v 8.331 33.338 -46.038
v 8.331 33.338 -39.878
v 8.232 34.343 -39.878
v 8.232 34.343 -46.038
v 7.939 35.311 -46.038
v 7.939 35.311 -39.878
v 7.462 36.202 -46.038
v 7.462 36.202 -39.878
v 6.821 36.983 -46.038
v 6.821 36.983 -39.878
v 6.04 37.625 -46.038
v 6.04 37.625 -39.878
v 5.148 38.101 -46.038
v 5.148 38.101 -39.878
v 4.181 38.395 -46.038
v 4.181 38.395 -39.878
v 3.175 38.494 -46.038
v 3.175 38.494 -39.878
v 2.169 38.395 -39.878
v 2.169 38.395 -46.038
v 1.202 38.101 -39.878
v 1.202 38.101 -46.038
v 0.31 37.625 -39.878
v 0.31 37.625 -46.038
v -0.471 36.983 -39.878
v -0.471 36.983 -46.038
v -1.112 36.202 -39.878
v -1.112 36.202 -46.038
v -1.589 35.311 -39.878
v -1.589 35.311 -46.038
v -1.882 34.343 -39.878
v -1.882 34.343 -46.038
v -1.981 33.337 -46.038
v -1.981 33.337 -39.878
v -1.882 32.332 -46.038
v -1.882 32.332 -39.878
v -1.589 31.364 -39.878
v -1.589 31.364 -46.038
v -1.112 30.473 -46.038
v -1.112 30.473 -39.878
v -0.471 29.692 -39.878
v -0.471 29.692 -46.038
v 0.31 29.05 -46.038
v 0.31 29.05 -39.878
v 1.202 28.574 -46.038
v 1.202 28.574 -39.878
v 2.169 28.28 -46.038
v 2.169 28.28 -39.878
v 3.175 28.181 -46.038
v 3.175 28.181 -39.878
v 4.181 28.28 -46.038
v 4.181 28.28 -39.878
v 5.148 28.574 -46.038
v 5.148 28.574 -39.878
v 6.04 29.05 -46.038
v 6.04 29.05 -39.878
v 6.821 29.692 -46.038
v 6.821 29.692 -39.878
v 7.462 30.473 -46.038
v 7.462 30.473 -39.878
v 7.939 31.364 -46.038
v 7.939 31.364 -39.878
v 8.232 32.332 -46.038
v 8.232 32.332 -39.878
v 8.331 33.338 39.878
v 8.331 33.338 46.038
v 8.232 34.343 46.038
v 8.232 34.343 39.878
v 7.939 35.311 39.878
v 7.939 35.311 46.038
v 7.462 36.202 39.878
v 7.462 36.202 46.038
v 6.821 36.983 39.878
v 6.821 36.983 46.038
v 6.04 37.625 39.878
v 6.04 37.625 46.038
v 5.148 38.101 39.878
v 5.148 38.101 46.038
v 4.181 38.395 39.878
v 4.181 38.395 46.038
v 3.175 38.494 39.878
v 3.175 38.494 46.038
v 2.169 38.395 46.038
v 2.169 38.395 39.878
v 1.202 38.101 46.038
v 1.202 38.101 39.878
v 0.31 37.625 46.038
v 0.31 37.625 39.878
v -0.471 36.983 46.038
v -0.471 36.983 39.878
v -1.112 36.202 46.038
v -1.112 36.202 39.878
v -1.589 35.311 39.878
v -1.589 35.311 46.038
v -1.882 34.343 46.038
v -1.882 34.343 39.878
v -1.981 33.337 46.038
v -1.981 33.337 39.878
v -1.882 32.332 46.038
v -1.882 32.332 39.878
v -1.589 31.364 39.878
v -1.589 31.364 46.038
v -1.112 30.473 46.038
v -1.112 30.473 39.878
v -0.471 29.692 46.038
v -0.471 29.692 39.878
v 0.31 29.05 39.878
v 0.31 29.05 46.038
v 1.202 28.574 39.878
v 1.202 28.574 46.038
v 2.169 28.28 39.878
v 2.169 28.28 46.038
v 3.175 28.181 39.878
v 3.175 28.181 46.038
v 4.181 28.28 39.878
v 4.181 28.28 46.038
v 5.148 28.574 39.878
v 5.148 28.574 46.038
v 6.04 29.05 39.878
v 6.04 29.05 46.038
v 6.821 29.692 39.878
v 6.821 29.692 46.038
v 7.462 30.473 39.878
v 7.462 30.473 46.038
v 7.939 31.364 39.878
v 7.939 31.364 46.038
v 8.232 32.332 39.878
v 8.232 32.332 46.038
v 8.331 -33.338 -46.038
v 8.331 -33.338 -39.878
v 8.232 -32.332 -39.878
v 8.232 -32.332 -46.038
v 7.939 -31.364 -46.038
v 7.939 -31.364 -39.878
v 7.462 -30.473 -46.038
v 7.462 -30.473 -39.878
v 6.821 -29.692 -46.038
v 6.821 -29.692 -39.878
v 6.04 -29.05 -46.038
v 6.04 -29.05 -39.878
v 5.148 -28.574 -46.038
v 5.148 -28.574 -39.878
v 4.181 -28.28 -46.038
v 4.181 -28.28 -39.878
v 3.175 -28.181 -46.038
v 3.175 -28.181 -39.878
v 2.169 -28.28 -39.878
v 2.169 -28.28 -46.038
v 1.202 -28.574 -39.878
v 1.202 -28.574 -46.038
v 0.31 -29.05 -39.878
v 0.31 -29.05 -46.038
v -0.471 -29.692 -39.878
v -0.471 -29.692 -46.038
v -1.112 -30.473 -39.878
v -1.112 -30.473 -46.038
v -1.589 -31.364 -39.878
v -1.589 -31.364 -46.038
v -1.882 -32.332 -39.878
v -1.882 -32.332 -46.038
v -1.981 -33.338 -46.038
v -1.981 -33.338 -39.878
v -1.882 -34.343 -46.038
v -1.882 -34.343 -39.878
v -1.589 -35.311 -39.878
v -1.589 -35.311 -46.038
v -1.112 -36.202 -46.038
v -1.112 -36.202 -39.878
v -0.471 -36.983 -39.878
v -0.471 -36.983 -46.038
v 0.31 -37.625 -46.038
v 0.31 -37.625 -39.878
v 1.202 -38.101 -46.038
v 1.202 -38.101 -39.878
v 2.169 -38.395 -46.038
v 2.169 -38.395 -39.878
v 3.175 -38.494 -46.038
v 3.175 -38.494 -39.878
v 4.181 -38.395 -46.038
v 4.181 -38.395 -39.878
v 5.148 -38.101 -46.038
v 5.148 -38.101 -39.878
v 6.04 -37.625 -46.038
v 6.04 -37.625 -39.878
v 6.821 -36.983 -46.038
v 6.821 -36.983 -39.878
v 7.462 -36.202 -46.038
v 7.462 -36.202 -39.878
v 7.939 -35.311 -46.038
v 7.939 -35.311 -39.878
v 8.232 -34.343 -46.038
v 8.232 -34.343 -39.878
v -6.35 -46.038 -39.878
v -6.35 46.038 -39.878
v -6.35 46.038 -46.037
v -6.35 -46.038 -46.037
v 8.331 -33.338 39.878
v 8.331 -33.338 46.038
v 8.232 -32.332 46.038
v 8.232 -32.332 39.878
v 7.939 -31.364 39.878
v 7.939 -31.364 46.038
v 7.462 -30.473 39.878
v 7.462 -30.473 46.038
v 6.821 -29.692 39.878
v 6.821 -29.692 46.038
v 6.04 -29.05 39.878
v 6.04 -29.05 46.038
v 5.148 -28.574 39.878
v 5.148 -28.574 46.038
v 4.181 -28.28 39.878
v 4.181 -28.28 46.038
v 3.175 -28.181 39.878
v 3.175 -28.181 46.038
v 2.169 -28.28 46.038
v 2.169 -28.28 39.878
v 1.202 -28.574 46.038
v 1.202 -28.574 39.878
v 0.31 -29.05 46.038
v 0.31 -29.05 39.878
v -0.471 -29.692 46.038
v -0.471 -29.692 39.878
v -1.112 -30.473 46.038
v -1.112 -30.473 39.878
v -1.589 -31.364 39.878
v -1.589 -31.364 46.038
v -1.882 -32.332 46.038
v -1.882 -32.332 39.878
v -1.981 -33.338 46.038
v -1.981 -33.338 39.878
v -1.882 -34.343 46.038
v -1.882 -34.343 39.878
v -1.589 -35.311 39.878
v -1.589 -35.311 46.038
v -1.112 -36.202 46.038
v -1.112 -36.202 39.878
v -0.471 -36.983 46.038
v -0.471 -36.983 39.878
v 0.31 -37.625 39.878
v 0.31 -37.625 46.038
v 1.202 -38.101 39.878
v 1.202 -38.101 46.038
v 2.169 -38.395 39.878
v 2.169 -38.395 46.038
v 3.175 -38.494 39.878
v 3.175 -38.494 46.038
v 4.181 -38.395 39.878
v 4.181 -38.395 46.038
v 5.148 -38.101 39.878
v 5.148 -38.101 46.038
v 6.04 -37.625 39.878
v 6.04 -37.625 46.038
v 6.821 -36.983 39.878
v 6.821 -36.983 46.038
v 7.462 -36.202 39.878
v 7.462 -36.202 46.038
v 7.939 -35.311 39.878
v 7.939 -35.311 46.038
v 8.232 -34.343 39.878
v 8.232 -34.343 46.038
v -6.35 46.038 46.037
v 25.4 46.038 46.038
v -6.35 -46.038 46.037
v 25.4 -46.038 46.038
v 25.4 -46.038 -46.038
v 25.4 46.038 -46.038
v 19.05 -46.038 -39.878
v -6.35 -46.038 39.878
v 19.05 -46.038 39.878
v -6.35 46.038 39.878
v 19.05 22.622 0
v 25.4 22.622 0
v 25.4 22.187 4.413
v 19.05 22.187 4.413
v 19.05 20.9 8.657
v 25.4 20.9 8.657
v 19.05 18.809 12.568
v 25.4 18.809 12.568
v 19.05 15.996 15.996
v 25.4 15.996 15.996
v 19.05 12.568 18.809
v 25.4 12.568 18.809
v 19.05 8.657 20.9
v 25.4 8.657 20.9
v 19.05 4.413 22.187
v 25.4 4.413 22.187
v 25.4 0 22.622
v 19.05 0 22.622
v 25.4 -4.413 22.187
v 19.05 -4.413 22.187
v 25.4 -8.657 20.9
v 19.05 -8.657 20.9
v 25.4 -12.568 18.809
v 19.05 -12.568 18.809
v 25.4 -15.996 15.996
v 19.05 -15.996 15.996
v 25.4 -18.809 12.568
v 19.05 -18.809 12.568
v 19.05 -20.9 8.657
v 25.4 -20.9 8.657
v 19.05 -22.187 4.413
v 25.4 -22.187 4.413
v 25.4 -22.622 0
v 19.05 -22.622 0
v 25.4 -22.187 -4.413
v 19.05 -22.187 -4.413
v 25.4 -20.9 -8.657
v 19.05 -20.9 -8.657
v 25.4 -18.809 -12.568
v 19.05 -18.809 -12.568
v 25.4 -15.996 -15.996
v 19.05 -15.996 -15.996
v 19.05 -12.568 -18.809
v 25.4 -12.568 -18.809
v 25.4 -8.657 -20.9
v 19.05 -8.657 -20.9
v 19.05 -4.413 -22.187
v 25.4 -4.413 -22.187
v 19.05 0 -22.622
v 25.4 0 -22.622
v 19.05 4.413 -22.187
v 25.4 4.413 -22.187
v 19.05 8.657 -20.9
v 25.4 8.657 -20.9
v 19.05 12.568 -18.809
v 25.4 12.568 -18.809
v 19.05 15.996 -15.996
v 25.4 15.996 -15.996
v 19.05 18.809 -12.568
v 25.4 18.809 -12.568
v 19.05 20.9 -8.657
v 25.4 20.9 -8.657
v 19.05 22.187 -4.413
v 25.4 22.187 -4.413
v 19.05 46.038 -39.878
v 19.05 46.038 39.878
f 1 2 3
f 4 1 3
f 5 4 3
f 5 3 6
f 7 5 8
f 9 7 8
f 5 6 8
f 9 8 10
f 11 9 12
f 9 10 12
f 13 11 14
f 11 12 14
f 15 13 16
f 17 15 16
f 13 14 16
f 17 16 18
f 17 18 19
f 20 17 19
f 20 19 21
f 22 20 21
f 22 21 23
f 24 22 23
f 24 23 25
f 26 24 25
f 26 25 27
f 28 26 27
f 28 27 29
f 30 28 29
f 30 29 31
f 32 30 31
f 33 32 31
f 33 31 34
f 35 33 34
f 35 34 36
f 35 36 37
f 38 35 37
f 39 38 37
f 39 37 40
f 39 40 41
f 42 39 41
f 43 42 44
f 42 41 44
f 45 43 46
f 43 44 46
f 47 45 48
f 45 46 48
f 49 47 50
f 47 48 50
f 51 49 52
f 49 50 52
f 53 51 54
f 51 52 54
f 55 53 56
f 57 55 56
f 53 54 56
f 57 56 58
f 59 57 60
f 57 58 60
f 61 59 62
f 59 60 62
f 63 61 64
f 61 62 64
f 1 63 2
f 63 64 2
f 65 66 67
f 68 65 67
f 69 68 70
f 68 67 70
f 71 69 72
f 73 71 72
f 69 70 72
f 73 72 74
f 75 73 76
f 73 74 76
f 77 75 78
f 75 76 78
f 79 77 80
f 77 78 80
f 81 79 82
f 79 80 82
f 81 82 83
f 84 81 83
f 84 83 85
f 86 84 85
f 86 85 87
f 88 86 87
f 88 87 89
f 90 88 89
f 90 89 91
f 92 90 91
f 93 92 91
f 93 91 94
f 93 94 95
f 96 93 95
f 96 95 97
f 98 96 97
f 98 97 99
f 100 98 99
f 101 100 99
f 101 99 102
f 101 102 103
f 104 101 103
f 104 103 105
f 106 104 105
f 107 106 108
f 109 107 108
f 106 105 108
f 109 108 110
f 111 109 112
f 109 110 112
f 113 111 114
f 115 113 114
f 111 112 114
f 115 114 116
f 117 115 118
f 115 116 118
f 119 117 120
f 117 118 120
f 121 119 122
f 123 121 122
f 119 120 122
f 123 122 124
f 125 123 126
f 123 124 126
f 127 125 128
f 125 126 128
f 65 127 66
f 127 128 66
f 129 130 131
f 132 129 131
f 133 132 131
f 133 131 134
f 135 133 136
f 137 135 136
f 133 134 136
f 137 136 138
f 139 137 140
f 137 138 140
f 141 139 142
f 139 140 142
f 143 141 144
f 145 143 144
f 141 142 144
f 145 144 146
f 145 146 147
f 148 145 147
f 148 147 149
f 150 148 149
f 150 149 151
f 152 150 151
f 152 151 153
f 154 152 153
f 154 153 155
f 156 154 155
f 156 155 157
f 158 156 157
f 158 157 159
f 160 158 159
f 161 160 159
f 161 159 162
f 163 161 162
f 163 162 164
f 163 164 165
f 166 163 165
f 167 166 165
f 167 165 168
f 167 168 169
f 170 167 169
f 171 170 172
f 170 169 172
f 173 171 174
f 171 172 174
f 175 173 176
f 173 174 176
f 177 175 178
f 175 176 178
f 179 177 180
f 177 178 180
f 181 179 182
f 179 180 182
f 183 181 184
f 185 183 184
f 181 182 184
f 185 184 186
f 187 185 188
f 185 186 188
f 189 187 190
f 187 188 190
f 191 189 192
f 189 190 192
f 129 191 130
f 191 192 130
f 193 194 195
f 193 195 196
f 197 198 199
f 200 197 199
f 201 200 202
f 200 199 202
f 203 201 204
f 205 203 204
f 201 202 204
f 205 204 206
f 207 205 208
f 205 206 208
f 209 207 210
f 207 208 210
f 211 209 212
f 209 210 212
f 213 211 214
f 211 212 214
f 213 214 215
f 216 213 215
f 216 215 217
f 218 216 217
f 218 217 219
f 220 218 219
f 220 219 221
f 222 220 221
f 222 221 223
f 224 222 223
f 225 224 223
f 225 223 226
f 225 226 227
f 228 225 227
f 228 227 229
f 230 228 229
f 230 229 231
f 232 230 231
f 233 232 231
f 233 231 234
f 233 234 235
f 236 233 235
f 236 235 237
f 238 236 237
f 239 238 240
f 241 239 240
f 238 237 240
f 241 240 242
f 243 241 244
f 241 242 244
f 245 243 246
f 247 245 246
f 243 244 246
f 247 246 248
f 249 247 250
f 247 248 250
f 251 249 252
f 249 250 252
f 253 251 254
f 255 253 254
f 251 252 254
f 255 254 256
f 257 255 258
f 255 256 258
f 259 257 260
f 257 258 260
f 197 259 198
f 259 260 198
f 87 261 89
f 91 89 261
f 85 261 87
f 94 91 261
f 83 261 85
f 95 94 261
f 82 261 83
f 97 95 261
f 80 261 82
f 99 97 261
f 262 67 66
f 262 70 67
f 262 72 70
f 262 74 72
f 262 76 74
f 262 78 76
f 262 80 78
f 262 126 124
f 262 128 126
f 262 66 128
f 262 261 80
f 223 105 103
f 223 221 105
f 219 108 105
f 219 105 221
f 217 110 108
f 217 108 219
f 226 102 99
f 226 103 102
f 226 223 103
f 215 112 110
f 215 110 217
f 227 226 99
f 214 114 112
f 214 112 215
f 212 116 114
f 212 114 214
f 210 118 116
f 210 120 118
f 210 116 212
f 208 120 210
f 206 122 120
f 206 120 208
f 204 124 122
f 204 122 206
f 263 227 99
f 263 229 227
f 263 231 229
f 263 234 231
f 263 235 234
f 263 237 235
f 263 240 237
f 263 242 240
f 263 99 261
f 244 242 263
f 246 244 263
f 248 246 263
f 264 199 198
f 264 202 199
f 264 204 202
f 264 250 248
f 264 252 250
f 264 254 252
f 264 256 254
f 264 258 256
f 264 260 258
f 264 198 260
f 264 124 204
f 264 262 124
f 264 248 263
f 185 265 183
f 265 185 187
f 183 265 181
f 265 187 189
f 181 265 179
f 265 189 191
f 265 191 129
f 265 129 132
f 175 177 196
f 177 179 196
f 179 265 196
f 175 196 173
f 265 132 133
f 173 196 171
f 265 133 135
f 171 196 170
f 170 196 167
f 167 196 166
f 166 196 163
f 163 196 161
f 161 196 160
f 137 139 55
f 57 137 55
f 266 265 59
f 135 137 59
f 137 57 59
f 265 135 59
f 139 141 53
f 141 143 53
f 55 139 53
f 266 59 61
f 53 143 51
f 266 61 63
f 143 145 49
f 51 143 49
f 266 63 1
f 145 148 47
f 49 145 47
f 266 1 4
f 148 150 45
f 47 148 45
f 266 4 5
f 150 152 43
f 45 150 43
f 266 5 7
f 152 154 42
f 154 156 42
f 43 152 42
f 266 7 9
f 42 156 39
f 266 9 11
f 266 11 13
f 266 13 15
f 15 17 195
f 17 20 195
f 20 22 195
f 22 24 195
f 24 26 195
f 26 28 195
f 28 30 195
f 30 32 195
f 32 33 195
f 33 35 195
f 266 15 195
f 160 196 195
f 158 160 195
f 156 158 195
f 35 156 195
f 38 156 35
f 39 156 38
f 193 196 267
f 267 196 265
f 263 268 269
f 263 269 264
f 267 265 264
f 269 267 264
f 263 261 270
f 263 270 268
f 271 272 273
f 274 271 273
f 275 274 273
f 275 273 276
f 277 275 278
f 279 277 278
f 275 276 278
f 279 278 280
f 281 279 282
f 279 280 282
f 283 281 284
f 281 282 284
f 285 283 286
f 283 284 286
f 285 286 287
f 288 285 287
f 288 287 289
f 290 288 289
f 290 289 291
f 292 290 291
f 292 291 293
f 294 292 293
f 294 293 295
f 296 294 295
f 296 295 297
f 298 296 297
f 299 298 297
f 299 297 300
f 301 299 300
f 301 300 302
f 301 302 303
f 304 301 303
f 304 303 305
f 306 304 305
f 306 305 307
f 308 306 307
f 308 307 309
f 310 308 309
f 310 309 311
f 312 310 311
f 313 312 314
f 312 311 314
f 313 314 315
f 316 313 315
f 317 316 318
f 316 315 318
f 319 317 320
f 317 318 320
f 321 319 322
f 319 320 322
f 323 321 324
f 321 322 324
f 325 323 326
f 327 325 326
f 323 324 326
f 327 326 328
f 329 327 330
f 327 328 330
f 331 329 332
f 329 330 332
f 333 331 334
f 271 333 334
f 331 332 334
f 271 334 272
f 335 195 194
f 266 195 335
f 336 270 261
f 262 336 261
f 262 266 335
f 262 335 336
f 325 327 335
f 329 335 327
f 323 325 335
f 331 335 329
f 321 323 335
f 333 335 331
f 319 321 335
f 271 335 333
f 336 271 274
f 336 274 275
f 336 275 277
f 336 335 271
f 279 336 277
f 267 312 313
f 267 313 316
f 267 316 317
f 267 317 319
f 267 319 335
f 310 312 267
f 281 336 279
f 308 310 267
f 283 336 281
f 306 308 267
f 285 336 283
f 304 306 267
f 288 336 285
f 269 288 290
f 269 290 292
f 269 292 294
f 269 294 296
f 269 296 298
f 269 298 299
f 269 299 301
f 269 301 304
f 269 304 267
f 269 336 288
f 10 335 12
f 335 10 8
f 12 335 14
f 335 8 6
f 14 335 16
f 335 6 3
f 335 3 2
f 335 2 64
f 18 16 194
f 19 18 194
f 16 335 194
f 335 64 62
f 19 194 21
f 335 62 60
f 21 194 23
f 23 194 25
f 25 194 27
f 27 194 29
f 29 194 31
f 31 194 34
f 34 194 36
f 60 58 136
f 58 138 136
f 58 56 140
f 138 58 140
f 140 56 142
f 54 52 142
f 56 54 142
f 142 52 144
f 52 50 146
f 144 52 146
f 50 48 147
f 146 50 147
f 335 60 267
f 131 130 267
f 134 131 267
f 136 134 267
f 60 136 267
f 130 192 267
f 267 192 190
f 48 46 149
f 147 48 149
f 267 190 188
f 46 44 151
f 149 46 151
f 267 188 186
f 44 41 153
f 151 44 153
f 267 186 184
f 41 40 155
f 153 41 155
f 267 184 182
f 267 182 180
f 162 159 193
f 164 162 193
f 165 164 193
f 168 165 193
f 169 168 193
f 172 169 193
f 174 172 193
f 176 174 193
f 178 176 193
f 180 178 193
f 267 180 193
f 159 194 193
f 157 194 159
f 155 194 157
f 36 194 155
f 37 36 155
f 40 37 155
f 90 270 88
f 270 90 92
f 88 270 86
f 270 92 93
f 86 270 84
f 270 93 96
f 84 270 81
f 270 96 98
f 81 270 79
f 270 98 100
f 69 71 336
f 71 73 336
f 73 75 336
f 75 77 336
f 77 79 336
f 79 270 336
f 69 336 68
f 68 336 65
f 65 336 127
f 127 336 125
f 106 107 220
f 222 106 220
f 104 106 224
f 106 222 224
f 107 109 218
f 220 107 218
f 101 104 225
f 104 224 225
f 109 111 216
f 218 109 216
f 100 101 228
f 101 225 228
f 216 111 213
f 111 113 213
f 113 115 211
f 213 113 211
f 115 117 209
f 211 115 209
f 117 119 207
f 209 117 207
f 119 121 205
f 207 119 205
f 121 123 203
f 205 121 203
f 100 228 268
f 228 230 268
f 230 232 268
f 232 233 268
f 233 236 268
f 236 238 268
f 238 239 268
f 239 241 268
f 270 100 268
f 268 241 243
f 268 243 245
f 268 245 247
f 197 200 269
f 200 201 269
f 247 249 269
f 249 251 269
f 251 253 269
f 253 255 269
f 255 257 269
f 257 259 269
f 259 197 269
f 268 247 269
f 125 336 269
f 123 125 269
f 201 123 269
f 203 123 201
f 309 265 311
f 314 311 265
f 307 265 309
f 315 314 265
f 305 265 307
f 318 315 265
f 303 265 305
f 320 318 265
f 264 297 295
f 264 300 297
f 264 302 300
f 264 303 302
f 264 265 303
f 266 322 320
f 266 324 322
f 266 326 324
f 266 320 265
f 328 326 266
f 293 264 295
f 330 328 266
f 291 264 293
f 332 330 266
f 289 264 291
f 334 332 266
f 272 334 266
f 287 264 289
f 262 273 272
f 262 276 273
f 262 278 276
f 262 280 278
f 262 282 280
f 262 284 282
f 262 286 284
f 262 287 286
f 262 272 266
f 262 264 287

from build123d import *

# Parameters (mm, degrees)
F0_W     = 92.075
F0_H     = 92.075
F1_DEPTH = 25.4
F2_W     = 165.1
F2_H     = 79.756
F3_DEPTH = 19.05
F4_R     = 22.621875
F5_DEPTH = 25.401
F6_W     = 92.075
F6_H     = 6.1595
F7_DEPTH = 6.35
F8_R     = 5.1562
F9_DEPTH = 92.076


with BuildPart() as f1:
    # F0 (on Right) → F1 (new body)
    with BuildSketch(Plane.YZ):
        Rectangle(F0_W, F0_H)
    extrude(amount=F1_DEPTH)

    # F2 (on face) → F3 (cut)
    with BuildSketch(Plane(origin=(0, 0, 0), x_dir=(0, -1, 0), z_dir=(-1, 0, 0))):
        Rectangle(F2_W, F2_H)
    extrude(amount=-F3_DEPTH, mode=Mode.SUBTRACT)

    # F4 (on face) → F5 (cut, through all)
    with BuildSketch(Plane.YZ.offset(25.4)):
        Circle(F4_R)
    extrude(amount=-F5_DEPTH, mode=Mode.SUBTRACT)

    # F6 (on face) → F7 (join)
    with BuildSketch(Plane(origin=(0, 0, 0), x_dir=(0, -1, 0), z_dir=(-1, 0, 0))):
        with Locations((0, 42.95775)):
            Rectangle(F6_W, F6_H)
        with Locations((0, -42.95775)):
            Rectangle(F6_W, F6_H)
    extrude(amount=F7_DEPTH)

    # F8 (on face) → F9 (cut, through all)
    with BuildSketch(Plane.XY.offset(46.0375)):
        with Locations((3.175, -33.3375)):
            Circle(F8_R)
        with Locations((3.175, 33.3375)):
            Circle(F8_R)
    extrude(amount=-F9_DEPTH, mode=Mode.SUBTRACT)


solid = f1.part
